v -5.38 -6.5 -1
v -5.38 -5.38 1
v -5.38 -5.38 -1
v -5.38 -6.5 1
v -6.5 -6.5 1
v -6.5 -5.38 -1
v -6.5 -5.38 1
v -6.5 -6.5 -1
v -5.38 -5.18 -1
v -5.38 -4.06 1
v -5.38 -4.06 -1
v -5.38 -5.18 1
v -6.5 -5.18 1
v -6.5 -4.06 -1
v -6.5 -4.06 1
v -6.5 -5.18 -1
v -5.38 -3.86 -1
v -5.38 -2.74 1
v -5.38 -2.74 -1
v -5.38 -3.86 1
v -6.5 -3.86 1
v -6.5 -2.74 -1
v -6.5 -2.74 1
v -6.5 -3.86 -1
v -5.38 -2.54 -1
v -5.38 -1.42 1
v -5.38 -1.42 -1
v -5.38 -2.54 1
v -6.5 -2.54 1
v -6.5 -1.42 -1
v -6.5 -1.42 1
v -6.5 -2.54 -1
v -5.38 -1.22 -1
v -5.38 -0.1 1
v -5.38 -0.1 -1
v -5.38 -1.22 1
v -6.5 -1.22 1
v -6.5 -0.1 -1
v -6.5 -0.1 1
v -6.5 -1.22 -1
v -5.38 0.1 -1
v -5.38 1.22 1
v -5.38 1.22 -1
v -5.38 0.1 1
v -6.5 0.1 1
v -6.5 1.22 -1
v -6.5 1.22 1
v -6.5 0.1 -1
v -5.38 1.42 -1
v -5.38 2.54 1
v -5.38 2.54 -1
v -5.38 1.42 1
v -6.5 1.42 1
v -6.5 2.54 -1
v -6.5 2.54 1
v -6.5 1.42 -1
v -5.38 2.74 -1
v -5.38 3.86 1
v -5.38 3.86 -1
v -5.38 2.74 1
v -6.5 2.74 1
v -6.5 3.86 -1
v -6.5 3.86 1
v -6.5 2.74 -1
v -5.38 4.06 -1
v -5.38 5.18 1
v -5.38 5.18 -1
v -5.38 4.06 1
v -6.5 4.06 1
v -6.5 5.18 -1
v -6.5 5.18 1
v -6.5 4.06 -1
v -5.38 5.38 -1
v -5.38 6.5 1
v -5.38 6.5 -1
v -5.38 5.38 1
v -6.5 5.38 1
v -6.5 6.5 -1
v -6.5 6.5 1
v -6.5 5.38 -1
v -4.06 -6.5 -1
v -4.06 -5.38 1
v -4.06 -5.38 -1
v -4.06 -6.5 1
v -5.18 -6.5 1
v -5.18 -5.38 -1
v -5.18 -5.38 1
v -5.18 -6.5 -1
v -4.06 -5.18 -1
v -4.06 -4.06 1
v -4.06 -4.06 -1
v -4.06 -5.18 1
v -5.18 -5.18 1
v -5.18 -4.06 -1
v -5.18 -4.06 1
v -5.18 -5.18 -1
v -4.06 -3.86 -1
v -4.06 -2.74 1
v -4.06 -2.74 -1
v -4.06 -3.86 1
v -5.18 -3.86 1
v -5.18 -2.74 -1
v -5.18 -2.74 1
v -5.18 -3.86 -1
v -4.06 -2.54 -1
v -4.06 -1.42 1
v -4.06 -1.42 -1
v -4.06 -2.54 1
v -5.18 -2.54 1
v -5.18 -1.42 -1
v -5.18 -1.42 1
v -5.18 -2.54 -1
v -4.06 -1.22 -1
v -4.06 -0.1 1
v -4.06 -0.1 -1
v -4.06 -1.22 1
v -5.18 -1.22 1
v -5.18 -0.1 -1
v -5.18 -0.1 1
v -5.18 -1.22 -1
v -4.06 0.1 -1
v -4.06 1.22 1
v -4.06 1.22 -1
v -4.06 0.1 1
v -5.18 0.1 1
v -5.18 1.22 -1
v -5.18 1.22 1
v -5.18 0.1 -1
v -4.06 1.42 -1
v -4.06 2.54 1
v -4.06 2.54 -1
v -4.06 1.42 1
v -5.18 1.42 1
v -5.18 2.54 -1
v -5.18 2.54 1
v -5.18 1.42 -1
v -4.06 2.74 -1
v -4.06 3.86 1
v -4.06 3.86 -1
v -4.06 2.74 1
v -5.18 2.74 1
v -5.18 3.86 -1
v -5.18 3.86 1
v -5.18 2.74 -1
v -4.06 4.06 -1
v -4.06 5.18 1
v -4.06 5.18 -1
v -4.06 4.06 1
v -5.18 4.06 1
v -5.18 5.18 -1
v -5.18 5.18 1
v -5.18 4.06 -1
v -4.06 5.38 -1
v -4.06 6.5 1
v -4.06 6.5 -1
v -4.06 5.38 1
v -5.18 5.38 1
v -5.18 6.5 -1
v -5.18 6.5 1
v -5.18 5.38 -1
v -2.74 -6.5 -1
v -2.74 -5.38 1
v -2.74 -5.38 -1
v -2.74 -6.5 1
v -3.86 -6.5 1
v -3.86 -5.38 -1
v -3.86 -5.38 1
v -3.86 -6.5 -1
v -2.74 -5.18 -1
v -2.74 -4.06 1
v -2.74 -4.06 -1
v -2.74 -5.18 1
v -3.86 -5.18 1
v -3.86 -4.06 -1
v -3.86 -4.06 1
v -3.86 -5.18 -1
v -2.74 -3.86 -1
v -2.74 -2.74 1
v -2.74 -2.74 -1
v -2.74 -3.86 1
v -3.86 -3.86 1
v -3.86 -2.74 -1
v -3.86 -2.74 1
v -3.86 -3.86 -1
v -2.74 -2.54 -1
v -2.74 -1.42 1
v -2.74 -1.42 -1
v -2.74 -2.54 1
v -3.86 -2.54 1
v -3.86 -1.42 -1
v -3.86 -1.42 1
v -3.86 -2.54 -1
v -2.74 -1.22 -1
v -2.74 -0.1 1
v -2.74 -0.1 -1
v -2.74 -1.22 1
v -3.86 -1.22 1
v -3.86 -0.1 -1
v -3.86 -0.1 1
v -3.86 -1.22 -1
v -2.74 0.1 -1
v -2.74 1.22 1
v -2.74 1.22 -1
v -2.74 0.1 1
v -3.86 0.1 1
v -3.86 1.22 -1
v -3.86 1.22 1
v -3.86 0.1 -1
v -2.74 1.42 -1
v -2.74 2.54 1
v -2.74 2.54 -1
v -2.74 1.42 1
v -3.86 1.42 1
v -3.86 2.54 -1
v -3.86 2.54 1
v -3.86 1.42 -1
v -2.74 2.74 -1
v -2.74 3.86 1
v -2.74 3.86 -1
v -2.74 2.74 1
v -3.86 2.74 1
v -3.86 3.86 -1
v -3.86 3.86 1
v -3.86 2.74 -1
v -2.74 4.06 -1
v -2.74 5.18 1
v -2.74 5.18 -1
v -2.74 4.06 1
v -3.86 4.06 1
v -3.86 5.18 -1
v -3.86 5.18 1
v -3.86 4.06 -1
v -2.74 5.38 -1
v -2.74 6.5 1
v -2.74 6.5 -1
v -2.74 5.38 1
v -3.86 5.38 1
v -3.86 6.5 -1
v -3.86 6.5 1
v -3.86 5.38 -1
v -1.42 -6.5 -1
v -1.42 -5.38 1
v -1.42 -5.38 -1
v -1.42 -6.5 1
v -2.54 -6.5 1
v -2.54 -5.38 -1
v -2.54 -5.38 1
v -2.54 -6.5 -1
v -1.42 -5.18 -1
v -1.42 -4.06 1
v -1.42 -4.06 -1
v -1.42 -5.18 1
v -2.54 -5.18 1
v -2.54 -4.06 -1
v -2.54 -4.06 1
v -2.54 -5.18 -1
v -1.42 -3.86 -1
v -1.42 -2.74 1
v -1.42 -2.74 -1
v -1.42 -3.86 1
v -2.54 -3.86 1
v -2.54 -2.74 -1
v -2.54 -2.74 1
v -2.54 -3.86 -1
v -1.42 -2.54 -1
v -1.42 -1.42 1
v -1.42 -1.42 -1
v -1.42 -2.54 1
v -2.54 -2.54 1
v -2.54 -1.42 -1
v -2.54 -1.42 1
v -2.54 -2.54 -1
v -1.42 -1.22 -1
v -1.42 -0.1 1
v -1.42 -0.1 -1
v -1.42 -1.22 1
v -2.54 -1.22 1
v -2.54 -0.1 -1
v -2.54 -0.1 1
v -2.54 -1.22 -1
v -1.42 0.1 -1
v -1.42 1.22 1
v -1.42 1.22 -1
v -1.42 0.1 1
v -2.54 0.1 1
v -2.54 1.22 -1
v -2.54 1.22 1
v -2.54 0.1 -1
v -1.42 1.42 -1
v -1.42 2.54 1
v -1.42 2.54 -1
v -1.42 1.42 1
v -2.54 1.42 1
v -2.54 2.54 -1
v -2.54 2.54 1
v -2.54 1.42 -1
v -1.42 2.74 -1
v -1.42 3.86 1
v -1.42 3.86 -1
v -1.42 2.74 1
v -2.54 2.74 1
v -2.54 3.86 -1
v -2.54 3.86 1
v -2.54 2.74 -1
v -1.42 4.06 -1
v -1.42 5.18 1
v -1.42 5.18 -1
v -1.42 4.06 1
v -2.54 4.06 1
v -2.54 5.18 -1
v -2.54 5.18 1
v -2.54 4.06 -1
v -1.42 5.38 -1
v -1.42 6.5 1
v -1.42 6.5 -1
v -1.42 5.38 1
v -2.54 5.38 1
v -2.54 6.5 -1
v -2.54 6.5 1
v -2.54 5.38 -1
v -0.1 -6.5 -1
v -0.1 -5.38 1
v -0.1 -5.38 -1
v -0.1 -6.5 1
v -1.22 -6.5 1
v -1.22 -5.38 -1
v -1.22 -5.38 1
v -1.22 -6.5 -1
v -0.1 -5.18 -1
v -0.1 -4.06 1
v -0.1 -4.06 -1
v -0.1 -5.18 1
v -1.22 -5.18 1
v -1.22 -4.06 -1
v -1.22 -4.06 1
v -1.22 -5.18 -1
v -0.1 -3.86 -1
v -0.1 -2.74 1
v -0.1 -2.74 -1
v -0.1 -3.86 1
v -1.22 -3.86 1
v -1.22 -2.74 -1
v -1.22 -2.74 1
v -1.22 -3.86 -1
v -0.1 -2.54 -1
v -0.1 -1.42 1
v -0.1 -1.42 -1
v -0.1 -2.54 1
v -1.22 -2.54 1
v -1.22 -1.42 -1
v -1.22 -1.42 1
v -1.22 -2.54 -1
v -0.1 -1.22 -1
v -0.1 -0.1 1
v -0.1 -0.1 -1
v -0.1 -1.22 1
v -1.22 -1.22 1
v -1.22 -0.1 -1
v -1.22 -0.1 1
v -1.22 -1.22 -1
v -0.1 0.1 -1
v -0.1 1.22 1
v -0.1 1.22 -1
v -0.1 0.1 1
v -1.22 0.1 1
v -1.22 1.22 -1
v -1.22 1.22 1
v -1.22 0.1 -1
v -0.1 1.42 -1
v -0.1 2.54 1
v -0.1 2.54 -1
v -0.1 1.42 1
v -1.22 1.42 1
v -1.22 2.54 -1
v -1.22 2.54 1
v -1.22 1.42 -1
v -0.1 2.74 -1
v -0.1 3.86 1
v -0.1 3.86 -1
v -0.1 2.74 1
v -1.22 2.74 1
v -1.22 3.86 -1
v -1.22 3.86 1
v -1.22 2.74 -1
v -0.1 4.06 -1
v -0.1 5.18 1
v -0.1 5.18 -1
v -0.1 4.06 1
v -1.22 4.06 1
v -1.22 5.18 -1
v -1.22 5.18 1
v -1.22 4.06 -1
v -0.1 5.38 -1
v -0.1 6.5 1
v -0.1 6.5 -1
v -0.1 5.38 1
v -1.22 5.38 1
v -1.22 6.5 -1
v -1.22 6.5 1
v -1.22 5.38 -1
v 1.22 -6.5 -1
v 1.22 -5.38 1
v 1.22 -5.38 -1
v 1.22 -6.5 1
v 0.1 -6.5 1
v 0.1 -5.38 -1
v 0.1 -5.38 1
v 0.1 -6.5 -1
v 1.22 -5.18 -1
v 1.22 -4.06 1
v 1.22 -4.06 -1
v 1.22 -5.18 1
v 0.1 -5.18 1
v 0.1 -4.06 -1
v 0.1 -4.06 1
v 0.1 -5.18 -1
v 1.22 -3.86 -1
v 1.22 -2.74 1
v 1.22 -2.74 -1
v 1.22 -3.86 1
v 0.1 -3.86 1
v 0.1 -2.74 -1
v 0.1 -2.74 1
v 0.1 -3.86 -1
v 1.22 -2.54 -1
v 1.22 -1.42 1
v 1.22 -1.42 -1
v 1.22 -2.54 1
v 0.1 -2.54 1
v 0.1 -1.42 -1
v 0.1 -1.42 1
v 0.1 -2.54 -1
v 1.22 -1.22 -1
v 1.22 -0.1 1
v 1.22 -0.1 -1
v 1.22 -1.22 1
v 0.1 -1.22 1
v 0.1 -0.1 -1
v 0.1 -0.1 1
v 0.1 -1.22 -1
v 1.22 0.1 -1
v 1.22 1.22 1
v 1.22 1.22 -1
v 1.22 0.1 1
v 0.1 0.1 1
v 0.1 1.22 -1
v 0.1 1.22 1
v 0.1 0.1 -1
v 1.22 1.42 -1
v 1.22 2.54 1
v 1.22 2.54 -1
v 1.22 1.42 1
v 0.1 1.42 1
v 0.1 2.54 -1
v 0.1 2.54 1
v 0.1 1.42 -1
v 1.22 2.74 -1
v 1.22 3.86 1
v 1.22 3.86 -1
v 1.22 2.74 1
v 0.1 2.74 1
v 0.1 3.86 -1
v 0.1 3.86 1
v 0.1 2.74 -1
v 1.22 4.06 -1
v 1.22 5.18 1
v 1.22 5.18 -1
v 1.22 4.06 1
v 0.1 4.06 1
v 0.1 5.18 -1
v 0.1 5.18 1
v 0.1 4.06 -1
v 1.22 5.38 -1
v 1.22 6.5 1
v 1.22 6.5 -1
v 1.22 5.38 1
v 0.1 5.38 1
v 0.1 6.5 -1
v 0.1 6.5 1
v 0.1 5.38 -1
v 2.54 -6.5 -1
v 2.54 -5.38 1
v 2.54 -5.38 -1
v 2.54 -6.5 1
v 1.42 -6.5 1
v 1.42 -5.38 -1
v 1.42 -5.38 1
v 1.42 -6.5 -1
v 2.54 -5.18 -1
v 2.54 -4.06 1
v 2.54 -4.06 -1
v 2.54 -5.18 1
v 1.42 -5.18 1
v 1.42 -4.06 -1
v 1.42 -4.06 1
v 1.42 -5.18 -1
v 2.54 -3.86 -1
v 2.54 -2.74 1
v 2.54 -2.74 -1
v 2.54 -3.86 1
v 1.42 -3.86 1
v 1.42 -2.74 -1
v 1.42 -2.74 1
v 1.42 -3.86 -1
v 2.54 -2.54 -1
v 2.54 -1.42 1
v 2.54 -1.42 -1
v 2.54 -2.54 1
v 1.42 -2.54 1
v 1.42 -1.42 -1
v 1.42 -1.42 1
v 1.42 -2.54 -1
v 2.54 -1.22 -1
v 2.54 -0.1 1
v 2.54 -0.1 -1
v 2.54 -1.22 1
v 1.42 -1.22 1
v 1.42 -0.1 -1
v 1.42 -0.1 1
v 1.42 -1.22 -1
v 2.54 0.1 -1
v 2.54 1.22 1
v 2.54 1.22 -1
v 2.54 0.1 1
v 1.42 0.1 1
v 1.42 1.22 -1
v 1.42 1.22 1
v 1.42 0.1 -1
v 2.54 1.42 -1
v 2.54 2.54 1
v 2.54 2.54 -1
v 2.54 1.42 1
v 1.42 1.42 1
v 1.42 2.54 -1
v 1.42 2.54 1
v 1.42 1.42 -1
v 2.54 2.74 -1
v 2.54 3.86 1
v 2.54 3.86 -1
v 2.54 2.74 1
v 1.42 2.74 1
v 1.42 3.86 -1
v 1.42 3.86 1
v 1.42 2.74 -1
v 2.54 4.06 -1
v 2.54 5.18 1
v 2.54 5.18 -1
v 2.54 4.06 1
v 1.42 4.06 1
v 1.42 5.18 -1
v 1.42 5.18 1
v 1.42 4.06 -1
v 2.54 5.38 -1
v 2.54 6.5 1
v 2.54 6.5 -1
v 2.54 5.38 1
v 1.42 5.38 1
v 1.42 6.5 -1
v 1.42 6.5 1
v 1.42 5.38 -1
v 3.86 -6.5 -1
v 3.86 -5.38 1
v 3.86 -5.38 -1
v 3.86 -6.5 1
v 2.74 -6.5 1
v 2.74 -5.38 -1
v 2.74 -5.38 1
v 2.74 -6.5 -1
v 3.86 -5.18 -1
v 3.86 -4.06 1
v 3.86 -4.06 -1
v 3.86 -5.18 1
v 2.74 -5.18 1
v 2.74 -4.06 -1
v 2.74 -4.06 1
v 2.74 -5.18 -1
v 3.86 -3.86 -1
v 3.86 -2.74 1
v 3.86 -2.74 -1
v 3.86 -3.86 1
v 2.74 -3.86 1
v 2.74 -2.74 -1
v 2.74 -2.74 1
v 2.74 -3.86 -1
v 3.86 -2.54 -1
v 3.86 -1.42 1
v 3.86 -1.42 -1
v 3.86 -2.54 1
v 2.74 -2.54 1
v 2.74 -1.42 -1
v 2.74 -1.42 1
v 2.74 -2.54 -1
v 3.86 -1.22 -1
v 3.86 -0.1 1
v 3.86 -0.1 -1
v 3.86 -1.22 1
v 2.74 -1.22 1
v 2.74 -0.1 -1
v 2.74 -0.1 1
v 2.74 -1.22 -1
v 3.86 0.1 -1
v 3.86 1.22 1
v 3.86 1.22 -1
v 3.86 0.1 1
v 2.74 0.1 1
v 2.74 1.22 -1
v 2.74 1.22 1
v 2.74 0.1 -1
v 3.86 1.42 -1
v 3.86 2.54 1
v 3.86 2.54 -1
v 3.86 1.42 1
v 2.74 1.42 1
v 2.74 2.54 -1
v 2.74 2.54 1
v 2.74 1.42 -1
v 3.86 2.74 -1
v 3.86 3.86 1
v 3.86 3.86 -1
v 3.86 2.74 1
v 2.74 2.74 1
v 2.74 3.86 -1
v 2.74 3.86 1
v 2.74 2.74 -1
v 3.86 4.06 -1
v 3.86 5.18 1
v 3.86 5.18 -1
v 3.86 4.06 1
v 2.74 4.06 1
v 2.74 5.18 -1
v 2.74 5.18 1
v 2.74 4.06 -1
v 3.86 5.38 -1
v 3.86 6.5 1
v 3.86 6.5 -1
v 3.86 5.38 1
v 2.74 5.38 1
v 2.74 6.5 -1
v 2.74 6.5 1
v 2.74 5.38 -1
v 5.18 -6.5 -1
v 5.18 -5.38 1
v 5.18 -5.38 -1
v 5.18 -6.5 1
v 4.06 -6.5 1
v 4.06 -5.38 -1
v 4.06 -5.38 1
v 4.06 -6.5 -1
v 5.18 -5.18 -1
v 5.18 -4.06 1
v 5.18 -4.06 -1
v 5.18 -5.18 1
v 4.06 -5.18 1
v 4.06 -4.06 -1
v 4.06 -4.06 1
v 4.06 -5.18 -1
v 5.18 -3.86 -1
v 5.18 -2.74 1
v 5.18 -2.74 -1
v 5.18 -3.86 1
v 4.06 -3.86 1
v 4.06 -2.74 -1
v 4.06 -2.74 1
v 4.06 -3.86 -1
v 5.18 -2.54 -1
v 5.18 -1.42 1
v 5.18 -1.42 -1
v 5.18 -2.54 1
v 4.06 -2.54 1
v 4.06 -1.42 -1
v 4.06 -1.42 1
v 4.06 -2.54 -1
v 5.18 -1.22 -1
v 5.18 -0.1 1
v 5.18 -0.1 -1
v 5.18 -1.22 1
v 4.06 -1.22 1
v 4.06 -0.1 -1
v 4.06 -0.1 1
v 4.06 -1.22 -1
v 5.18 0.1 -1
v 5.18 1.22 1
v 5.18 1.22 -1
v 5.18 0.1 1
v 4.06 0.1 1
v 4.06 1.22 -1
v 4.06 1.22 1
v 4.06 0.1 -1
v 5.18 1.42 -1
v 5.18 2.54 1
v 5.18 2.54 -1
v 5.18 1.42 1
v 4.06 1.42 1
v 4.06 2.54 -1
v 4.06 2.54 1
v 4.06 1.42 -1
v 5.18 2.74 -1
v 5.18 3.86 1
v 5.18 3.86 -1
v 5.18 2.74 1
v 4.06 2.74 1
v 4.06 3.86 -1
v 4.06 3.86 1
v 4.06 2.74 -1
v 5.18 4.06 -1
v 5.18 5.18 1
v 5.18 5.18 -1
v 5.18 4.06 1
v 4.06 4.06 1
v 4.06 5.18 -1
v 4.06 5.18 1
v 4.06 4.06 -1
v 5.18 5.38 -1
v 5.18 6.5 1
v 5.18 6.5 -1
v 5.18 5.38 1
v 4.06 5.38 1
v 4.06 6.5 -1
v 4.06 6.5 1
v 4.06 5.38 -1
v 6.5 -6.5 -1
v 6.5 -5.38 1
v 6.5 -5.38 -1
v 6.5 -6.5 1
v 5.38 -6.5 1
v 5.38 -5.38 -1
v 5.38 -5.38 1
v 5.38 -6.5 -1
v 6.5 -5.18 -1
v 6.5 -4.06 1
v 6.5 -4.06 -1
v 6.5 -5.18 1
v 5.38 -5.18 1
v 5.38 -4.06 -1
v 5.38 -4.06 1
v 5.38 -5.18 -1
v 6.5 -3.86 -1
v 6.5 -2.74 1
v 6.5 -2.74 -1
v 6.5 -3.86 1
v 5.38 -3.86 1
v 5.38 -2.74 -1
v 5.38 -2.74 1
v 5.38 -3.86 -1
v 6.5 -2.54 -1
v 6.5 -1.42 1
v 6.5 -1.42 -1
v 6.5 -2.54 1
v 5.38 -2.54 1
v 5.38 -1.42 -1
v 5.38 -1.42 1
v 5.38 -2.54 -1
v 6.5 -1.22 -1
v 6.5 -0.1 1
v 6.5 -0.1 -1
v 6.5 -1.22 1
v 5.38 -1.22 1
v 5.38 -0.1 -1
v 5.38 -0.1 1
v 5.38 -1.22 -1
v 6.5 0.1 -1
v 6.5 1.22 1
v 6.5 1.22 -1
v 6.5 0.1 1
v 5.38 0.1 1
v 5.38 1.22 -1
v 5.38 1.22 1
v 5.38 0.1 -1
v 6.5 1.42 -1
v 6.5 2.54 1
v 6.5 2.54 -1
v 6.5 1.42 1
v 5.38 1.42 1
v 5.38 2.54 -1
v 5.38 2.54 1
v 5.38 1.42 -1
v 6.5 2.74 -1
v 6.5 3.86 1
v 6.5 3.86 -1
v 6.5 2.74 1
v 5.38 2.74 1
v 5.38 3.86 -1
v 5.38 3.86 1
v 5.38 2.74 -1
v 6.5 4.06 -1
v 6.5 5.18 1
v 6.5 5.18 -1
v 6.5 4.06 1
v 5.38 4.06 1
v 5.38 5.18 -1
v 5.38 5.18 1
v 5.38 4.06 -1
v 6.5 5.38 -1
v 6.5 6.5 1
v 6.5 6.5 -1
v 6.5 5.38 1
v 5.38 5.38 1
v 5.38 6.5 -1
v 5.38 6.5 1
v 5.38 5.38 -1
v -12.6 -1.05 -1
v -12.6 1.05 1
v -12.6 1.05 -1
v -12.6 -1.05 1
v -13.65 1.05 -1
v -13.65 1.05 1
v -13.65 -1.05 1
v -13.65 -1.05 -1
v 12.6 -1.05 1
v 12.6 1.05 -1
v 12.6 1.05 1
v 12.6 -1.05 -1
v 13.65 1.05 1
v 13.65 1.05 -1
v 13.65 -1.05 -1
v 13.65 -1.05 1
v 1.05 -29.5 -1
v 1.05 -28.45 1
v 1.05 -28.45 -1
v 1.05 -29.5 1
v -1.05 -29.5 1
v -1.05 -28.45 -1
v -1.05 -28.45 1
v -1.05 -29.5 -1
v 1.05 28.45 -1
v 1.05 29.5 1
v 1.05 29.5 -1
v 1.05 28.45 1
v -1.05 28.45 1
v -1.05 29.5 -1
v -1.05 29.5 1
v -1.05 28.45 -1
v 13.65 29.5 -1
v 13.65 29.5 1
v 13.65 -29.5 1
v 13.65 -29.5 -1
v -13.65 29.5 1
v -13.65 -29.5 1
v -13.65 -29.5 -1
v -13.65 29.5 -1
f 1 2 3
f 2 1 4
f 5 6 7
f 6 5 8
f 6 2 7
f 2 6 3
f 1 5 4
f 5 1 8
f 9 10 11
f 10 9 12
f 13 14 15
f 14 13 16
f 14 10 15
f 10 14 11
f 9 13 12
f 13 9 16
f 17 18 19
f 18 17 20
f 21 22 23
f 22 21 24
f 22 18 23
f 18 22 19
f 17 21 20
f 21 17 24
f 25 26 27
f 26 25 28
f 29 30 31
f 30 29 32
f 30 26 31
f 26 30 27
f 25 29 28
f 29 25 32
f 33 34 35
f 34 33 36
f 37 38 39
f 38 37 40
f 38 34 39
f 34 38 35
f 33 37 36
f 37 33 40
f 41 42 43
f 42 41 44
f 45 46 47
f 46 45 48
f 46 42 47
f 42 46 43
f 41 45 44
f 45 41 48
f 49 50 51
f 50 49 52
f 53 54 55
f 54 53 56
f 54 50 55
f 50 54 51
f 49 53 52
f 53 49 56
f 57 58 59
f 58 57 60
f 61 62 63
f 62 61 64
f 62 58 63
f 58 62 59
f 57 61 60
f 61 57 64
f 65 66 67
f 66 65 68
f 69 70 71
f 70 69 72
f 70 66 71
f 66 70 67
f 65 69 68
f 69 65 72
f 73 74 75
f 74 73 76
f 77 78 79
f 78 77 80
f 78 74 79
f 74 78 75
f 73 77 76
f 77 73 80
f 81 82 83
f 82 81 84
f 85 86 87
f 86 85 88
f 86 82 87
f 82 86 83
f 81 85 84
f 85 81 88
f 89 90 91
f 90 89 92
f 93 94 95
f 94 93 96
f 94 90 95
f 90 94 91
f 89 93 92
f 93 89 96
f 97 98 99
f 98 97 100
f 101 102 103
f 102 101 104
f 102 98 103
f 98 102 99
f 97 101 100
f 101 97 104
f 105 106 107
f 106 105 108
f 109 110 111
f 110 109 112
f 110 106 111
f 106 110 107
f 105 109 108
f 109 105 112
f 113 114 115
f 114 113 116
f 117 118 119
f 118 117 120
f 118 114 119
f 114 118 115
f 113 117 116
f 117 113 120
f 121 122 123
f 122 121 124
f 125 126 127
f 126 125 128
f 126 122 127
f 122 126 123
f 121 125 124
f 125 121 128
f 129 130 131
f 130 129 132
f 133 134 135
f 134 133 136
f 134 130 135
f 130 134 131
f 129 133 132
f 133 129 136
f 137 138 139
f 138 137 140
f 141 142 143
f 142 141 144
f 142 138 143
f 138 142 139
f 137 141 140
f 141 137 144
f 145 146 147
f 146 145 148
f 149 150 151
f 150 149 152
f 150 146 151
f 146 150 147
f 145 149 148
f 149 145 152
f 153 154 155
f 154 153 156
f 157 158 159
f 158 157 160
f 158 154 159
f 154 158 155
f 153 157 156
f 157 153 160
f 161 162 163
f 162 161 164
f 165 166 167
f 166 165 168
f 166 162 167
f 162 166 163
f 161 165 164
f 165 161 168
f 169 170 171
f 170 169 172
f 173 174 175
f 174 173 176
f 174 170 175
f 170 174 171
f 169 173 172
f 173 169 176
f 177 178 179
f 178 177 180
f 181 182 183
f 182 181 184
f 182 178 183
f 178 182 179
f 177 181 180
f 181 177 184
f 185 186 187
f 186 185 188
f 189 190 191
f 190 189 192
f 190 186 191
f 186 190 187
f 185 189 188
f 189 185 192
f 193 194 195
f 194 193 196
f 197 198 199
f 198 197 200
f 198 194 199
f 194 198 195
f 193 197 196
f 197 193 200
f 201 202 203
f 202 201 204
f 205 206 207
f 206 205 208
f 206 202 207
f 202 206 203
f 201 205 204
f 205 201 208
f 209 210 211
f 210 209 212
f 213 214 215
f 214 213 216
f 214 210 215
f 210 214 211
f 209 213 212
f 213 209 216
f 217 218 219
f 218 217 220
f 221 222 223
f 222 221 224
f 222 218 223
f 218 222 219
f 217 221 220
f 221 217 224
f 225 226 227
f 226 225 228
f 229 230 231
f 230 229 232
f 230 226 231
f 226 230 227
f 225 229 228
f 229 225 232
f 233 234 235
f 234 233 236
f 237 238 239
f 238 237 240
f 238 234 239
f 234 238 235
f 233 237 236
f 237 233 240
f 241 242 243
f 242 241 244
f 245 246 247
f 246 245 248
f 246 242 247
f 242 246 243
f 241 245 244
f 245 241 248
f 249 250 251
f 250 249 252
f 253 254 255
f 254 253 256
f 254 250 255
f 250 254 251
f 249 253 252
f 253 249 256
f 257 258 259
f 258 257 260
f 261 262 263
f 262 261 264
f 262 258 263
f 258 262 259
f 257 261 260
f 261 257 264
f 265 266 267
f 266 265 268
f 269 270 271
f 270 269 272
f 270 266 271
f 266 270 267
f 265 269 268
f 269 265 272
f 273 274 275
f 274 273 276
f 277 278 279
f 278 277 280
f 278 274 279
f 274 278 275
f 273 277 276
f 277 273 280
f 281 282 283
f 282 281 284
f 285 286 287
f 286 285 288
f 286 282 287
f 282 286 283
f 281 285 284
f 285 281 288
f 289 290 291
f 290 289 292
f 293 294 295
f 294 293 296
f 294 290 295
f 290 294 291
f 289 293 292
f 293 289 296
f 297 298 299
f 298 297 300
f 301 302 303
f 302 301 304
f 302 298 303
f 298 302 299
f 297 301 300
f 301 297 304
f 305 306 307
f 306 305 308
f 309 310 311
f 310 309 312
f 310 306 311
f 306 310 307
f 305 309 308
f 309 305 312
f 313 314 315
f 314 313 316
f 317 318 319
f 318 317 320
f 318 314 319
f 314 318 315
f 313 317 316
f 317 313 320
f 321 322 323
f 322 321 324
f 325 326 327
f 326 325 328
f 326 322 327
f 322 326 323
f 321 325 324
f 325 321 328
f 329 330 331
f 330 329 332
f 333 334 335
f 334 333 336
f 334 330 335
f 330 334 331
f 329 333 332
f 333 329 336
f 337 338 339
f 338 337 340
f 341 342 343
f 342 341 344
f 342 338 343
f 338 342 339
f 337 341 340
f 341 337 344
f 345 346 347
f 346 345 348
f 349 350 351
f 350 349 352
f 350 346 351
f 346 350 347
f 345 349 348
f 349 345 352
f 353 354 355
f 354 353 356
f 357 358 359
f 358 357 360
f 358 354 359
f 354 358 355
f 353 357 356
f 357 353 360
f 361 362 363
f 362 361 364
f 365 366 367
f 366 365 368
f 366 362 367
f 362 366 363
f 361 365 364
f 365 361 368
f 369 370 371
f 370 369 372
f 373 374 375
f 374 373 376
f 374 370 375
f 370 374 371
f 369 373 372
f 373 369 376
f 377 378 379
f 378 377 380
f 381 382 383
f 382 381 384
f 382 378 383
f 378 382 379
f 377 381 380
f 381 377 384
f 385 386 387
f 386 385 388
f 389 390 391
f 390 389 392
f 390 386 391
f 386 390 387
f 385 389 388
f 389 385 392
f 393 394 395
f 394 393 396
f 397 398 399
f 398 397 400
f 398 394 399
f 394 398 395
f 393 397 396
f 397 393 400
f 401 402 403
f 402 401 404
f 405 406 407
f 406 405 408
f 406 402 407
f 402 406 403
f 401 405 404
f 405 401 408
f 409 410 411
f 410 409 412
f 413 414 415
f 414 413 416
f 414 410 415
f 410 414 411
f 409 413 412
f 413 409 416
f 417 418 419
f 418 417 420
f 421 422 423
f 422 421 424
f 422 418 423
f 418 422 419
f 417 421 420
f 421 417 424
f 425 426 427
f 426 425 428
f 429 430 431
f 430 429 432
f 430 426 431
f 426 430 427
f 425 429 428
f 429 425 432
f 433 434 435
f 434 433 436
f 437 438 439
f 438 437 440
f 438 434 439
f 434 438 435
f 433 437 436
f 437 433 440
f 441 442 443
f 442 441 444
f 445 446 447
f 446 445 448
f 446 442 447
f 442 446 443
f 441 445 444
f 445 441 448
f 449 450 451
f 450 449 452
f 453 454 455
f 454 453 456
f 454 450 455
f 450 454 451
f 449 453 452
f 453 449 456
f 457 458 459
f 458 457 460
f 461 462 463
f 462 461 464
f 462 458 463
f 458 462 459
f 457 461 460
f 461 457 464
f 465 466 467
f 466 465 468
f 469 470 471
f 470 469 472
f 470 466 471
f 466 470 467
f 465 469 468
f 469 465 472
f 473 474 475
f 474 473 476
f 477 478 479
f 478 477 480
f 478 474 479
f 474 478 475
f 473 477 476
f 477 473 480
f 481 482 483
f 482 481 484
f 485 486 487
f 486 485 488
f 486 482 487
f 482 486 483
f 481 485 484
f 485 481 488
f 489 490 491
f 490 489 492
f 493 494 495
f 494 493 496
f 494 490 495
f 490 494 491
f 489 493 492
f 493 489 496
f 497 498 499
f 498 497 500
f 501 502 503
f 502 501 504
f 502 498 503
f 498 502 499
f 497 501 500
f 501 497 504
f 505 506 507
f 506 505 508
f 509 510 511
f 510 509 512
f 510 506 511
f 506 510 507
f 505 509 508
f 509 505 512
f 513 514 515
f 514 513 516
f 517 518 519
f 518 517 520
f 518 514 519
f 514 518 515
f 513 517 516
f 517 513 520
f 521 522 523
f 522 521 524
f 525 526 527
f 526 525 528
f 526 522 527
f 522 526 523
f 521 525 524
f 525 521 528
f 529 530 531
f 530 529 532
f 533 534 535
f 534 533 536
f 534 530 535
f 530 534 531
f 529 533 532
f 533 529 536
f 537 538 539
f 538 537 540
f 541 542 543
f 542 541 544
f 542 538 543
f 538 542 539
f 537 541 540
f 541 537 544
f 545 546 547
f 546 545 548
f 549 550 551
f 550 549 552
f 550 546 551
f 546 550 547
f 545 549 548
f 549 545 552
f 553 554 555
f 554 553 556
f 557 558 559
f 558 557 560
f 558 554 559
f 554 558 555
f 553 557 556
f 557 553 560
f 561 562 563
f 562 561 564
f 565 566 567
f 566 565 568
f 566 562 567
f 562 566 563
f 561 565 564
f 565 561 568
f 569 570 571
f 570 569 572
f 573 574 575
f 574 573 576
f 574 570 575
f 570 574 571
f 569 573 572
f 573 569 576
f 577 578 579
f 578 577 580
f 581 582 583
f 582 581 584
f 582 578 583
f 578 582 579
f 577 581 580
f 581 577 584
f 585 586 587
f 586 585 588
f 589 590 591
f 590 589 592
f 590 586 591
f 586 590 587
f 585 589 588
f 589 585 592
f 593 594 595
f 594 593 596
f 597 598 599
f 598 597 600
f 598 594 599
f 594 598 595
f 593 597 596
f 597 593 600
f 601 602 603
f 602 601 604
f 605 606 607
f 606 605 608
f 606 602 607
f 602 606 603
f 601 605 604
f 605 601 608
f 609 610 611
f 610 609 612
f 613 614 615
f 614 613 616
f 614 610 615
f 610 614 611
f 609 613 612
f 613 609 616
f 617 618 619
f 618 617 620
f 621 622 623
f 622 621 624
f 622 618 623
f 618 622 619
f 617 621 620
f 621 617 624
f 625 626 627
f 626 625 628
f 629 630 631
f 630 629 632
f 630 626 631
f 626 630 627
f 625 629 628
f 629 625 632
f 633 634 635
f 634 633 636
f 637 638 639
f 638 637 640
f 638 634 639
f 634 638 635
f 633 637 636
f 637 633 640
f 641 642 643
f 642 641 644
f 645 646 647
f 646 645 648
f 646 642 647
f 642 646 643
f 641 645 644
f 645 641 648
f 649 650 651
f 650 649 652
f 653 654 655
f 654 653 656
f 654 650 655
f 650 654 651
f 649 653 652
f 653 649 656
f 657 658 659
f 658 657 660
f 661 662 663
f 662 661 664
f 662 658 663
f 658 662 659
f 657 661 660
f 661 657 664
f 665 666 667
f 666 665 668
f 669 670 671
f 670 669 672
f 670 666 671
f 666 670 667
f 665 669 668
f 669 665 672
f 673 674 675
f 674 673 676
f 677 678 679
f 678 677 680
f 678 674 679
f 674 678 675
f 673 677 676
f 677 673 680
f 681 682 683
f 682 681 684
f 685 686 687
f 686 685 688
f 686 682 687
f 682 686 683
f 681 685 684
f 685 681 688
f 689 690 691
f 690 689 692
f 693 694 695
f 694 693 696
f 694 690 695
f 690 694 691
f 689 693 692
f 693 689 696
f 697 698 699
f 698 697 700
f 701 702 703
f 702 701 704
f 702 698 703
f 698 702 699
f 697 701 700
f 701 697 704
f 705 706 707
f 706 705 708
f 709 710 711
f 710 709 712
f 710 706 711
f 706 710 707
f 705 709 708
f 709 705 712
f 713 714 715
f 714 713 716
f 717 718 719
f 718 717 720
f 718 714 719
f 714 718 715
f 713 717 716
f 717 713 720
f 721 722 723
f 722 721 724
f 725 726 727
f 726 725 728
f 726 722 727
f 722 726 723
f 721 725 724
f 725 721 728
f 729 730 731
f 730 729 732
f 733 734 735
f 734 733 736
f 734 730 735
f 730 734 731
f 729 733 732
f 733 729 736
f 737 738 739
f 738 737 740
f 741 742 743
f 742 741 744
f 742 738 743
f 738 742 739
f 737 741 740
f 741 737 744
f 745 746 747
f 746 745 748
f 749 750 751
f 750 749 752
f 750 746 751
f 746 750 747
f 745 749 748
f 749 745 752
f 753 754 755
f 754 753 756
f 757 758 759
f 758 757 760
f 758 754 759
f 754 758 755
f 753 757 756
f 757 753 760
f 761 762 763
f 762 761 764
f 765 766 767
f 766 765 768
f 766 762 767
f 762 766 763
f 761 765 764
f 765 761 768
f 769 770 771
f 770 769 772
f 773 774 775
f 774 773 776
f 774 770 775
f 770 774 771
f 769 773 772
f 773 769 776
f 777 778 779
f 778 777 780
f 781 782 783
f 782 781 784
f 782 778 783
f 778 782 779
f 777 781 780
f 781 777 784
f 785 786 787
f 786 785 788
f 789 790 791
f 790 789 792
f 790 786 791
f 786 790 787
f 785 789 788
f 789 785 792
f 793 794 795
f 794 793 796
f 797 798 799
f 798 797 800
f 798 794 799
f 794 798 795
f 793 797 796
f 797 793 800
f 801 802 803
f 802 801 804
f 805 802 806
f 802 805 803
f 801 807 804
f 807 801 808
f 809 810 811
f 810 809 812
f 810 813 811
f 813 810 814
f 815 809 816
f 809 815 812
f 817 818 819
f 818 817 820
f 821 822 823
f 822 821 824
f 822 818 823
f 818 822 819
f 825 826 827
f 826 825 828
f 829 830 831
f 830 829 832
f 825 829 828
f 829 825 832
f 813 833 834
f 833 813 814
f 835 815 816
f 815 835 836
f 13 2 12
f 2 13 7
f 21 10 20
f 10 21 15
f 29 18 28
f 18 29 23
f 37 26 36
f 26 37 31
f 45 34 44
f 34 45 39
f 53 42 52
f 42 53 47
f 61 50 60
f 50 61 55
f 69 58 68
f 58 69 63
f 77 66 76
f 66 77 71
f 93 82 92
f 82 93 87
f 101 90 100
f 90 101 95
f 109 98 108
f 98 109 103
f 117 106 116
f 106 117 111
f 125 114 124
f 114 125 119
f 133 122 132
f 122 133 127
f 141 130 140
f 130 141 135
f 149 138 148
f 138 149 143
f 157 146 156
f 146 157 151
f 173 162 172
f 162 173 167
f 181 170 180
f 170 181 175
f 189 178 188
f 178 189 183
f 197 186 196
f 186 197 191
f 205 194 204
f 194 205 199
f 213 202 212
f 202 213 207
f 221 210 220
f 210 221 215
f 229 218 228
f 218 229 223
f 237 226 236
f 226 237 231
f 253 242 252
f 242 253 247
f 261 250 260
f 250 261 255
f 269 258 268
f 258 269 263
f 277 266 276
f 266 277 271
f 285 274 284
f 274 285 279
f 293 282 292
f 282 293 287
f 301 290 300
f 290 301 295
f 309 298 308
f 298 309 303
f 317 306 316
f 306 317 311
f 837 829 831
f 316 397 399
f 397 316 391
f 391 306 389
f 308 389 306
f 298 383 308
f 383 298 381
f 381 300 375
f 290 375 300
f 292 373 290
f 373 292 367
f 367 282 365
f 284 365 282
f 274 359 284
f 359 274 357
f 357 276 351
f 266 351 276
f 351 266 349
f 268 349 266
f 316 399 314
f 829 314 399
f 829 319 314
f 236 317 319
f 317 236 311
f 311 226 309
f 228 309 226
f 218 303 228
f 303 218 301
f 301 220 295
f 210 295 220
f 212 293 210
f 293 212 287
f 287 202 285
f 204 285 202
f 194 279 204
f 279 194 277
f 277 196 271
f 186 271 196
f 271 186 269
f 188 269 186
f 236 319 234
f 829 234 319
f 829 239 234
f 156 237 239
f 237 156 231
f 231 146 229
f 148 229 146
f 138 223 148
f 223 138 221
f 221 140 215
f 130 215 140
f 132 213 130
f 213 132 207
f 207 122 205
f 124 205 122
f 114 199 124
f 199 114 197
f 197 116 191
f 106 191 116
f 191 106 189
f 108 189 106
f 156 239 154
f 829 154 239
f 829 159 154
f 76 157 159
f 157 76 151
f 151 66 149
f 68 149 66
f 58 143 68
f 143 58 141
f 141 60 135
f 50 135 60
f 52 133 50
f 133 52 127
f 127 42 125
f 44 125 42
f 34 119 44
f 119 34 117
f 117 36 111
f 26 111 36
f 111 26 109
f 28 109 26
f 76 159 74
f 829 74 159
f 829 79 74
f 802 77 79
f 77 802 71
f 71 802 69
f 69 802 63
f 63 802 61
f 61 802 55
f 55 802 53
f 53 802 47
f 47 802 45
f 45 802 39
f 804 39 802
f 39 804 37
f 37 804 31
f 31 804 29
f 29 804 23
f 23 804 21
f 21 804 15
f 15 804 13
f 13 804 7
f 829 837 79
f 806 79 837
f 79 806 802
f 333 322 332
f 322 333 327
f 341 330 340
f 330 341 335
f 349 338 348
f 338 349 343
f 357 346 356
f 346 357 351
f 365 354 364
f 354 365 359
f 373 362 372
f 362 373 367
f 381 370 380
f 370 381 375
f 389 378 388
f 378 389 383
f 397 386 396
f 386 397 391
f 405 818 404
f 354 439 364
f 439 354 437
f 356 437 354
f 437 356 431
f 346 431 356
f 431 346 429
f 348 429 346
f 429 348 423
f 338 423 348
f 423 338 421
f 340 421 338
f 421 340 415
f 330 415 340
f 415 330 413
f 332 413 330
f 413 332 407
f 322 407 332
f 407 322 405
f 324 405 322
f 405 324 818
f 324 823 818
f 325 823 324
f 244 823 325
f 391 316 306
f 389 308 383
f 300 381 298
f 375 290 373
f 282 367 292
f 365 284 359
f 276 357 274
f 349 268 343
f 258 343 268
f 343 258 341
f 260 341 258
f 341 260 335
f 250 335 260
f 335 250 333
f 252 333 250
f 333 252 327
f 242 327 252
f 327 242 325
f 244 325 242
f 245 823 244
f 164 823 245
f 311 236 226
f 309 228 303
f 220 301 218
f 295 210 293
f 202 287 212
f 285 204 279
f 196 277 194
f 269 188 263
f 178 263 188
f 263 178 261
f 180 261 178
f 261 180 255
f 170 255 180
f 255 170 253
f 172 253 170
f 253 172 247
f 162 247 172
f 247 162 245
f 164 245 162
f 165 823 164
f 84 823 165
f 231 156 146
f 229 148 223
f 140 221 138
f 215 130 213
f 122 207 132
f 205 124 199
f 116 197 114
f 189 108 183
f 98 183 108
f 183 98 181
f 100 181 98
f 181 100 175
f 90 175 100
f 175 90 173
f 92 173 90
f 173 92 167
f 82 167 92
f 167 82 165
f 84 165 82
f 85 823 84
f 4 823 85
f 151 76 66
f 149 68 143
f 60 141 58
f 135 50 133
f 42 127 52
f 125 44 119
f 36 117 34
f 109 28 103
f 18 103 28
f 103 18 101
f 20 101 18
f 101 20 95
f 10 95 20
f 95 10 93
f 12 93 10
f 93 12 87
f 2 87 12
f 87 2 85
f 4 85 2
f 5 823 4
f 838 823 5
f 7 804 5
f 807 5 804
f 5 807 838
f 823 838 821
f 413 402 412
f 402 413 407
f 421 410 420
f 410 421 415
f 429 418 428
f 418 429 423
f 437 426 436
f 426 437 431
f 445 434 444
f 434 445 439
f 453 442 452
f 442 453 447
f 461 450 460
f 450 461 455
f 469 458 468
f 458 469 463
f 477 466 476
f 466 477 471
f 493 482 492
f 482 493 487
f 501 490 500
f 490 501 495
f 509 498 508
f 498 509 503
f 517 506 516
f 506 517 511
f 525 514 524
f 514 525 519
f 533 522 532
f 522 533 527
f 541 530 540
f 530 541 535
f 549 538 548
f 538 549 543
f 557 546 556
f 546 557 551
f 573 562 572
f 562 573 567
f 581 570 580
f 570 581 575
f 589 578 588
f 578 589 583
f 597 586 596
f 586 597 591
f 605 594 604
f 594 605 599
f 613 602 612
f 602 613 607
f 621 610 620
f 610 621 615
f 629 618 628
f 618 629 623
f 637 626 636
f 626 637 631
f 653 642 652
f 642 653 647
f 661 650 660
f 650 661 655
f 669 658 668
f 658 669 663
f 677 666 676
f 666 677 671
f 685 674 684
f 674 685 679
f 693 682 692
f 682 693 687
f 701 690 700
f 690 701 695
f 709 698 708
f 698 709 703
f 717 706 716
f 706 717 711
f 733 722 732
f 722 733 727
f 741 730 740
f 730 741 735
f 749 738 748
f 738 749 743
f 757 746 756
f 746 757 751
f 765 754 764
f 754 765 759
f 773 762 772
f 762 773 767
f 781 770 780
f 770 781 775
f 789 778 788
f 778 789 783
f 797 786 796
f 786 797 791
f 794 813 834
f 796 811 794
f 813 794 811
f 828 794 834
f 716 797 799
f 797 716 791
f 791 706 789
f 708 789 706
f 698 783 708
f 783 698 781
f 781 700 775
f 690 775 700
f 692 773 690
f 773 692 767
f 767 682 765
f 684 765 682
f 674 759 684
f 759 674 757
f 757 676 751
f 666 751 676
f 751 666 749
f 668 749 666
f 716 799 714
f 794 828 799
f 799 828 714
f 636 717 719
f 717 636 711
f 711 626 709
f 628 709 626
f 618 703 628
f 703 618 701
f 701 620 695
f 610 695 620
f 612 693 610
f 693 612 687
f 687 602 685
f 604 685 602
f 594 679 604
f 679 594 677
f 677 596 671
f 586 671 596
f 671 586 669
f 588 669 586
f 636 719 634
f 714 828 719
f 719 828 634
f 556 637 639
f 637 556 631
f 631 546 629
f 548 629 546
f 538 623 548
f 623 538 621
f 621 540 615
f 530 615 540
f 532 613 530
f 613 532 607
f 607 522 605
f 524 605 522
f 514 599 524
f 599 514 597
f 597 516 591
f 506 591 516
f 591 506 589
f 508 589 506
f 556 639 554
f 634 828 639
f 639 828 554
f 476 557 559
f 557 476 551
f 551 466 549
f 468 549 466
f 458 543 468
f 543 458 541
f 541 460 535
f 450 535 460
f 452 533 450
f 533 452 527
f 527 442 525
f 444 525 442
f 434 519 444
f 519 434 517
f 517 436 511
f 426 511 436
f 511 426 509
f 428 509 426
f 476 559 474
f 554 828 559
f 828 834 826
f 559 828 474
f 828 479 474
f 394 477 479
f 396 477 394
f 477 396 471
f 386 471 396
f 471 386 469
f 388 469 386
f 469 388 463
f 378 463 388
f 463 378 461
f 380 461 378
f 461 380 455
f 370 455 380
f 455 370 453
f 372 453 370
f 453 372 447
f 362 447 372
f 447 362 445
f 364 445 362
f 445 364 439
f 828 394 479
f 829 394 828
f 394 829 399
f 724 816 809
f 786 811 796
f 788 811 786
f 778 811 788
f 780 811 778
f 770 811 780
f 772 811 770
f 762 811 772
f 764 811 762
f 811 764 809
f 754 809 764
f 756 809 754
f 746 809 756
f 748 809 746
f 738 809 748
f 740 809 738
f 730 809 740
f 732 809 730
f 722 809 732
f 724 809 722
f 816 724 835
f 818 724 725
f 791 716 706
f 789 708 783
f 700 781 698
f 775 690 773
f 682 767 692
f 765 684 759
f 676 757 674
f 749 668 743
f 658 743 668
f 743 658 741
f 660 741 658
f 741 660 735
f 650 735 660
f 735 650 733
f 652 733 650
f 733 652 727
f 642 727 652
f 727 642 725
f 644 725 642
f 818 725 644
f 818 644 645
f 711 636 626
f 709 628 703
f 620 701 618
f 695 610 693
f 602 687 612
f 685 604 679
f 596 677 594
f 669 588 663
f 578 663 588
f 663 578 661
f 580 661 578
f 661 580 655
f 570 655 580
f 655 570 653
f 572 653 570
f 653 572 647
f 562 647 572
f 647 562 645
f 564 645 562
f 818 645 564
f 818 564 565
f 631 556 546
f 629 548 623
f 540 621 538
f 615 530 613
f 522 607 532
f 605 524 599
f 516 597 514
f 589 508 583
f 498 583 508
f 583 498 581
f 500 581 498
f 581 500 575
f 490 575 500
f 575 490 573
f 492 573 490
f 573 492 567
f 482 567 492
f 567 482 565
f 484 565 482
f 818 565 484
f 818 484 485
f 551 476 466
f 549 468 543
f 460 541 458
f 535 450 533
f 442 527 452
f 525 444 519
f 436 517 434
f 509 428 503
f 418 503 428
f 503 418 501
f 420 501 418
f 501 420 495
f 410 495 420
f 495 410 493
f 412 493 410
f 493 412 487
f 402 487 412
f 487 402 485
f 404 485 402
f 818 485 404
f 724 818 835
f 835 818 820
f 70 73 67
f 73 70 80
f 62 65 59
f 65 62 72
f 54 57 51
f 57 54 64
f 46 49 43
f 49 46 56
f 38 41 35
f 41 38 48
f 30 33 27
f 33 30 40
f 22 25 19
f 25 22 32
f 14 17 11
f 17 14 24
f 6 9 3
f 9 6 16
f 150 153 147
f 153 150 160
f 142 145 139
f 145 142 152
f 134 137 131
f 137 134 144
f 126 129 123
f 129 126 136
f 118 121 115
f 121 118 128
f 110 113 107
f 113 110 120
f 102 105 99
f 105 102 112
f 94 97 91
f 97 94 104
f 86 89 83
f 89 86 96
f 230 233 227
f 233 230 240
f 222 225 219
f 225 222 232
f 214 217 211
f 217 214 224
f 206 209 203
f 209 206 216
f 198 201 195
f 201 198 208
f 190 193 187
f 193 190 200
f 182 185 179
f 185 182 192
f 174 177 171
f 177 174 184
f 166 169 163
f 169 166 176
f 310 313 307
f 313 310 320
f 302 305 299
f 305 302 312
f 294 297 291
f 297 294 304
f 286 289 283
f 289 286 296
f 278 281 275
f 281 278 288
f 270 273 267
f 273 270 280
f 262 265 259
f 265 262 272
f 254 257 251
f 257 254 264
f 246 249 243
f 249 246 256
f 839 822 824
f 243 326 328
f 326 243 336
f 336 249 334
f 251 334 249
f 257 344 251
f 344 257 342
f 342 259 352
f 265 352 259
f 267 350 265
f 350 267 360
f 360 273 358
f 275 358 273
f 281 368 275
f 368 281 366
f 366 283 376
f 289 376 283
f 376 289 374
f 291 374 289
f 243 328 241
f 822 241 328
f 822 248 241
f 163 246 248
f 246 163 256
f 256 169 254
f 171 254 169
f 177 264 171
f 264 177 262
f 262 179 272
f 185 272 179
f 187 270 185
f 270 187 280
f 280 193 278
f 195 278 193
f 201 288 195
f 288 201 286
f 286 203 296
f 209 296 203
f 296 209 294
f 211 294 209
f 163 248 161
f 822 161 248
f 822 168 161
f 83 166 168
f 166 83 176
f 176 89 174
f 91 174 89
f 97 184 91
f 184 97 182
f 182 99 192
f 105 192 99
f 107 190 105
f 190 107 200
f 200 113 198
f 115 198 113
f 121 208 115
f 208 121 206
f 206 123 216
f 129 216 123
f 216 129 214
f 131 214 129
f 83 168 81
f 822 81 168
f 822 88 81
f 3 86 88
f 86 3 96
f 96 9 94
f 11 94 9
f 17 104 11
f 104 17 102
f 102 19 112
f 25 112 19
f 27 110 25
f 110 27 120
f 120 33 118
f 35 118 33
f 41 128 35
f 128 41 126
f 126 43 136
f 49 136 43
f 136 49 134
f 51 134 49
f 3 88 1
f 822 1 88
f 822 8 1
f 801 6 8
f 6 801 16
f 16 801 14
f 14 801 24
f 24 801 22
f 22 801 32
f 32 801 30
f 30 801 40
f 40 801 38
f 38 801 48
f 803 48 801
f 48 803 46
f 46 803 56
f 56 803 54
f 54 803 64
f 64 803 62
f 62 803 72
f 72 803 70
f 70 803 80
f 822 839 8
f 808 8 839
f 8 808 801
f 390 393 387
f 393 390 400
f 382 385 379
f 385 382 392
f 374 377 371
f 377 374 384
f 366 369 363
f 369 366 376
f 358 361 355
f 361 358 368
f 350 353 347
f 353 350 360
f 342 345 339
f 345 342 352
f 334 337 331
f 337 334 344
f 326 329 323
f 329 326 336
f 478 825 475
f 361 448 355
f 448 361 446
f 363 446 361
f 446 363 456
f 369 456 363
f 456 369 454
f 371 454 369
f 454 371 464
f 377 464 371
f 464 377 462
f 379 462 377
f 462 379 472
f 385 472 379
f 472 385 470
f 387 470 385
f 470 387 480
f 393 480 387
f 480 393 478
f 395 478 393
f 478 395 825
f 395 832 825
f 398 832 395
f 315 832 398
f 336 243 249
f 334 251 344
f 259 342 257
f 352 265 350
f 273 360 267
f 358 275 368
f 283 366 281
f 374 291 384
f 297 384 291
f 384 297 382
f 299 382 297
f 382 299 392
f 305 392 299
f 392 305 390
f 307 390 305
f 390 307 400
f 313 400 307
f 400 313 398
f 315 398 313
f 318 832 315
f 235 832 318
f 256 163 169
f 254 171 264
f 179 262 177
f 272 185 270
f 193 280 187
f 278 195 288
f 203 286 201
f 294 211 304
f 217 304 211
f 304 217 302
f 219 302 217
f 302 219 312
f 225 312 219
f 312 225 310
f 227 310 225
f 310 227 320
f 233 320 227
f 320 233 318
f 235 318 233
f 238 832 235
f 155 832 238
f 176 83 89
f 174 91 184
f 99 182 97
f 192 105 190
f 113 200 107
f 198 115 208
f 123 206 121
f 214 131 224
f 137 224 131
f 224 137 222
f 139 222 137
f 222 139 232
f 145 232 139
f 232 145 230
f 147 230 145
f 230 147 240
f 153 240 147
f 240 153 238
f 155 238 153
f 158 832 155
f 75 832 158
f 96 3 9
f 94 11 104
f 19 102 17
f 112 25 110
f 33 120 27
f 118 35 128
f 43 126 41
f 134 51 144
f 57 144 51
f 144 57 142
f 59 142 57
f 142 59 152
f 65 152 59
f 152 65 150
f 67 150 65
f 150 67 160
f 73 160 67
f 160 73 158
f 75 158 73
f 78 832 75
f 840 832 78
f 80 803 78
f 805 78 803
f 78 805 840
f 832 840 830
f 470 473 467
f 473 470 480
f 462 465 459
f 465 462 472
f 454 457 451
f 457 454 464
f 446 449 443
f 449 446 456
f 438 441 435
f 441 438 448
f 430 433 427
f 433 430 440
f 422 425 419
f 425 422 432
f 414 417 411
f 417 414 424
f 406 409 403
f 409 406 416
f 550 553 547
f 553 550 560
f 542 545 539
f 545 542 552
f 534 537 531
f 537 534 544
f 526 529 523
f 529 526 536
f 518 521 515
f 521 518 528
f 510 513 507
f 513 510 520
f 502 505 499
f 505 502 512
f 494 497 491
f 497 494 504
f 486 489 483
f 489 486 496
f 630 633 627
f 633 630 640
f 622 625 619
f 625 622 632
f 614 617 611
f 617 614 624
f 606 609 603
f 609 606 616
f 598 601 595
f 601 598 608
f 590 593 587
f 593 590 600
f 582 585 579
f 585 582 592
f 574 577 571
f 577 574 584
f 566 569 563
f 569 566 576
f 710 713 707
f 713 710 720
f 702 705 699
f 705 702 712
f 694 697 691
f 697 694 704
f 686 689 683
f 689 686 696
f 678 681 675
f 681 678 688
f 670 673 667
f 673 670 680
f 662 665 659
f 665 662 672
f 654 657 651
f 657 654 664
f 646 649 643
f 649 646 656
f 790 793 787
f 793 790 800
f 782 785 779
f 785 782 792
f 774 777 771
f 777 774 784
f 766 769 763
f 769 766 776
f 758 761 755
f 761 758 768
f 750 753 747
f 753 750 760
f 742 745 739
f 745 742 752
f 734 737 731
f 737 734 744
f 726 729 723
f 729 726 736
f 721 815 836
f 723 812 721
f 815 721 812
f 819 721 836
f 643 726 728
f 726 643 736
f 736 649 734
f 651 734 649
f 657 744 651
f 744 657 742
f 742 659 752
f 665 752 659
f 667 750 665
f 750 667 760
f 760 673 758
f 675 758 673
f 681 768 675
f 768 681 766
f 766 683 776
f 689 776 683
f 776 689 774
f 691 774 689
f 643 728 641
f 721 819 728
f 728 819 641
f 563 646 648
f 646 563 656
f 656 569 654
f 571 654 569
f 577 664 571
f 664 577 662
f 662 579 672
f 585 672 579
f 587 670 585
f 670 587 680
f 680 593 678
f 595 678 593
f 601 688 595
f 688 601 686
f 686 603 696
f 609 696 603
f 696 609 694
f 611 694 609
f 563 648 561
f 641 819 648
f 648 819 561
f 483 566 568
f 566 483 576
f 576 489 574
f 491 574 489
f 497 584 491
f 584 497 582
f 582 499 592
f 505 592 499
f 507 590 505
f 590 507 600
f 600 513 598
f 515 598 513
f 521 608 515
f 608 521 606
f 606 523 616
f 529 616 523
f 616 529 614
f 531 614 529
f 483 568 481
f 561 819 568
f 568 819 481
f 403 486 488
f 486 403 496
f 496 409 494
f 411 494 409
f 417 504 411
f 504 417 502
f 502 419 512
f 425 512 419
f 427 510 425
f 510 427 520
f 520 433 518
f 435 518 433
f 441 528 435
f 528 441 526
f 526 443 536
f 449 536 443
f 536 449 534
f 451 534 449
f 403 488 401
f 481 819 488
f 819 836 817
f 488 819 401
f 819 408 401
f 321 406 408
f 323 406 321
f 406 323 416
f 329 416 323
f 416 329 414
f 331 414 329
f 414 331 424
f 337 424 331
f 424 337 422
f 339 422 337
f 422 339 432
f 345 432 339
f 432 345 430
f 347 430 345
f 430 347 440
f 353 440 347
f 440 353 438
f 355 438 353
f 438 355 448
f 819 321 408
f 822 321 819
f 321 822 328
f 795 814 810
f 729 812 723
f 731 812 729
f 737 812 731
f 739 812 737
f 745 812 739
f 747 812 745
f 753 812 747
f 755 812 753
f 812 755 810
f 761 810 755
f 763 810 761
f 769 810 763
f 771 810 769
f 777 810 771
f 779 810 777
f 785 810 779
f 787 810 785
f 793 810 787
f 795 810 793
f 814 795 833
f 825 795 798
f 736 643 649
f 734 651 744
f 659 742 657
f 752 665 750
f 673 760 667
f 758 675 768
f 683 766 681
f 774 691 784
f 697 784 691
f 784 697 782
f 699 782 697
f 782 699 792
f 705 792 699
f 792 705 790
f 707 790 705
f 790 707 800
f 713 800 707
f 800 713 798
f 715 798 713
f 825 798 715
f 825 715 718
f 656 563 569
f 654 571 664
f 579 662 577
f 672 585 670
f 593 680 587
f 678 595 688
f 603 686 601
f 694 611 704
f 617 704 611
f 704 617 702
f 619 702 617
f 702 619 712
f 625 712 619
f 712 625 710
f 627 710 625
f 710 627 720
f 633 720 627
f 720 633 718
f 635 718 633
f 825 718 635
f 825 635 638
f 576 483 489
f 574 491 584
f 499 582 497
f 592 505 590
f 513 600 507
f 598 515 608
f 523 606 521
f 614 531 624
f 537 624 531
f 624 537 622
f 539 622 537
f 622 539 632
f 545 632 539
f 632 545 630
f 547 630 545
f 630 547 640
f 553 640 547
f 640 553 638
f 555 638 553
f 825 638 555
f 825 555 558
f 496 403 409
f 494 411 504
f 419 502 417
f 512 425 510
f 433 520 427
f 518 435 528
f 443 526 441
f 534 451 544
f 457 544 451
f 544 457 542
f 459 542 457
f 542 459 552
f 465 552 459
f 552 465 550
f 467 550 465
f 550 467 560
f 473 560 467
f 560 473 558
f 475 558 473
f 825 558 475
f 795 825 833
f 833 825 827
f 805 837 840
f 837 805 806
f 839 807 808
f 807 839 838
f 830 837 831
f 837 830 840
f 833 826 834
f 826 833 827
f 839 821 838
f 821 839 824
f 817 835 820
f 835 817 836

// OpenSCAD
    //oocyte chamber
//updated by AM Chagas 20210506 -> larger grid
//designed by AM Chagas 20181001 CC BY 4.0 license
//inspired on the design from J Menzies.

expandValue = 0.2;
wellx = 0.92+expandValue;//0.3
welly = 0.92+expandValue;//0.7
wellz = 0.2;

interwell = 0.4-expandValue;

nwellsx = 10;
nwellsy = 10;

platey = (wellx-0.1)*nwellsx*5+8;//10;
platex = (welly-0.1)*nwellsy*1.5+12;//14;
platez = 2      ;





tol = 0.1;
$fn=20;
/*
module grid(){
    for (x = [0:nwellsx-1]){
        for (y = [0:nwellsy-1]){
            translate([x*(wellx+interwell),y*(welly+interwell),0]){
                cube([wellx,welly,wellz],center=true);
                }//end translate
            }//end for y
    }//end for x
}//end module
*/
module grid(holeThrough=0){
    for (x = [-nwellsx/2+0.5:nwellsx/2-0.5]){
        for (y = [-nwellsy/2+0.5:nwellsy/2-0.5]){
            translate([x*(wellx+interwell),y*(welly+interwell),platez/2-wellz/2+0.01]){
                if(holeThrough==1){
                    cube([wellx,welly,wellz+10],center=true);
                    }//endif
                else{
                 cube([wellx,welly,wellz],center=true);
                    }
                }//end translate
            }//end for y
    }//end for x
}//end module




difference(){


cube([platex,platey,platez],center=true);

grid(holeThrough=1);

for (x=[-platex/2,platex/2]){
    
translate([x,0,0]){
cube([2.1,2.1,10],center=true);
}//end translate
}//end for

for(y=[-platey/2,platey/2]){
translate([0,y,0]){
cube([2.1,2.1,10],center=true);
}//end translate
}//end for
    
}//end difference


/*
translate([-9.5,0,0.05]){
cube([4,15,platez],center=true);
}

translate([9.5,0,0.05]){
cube([4,15,platez],center=true);
}
*/
